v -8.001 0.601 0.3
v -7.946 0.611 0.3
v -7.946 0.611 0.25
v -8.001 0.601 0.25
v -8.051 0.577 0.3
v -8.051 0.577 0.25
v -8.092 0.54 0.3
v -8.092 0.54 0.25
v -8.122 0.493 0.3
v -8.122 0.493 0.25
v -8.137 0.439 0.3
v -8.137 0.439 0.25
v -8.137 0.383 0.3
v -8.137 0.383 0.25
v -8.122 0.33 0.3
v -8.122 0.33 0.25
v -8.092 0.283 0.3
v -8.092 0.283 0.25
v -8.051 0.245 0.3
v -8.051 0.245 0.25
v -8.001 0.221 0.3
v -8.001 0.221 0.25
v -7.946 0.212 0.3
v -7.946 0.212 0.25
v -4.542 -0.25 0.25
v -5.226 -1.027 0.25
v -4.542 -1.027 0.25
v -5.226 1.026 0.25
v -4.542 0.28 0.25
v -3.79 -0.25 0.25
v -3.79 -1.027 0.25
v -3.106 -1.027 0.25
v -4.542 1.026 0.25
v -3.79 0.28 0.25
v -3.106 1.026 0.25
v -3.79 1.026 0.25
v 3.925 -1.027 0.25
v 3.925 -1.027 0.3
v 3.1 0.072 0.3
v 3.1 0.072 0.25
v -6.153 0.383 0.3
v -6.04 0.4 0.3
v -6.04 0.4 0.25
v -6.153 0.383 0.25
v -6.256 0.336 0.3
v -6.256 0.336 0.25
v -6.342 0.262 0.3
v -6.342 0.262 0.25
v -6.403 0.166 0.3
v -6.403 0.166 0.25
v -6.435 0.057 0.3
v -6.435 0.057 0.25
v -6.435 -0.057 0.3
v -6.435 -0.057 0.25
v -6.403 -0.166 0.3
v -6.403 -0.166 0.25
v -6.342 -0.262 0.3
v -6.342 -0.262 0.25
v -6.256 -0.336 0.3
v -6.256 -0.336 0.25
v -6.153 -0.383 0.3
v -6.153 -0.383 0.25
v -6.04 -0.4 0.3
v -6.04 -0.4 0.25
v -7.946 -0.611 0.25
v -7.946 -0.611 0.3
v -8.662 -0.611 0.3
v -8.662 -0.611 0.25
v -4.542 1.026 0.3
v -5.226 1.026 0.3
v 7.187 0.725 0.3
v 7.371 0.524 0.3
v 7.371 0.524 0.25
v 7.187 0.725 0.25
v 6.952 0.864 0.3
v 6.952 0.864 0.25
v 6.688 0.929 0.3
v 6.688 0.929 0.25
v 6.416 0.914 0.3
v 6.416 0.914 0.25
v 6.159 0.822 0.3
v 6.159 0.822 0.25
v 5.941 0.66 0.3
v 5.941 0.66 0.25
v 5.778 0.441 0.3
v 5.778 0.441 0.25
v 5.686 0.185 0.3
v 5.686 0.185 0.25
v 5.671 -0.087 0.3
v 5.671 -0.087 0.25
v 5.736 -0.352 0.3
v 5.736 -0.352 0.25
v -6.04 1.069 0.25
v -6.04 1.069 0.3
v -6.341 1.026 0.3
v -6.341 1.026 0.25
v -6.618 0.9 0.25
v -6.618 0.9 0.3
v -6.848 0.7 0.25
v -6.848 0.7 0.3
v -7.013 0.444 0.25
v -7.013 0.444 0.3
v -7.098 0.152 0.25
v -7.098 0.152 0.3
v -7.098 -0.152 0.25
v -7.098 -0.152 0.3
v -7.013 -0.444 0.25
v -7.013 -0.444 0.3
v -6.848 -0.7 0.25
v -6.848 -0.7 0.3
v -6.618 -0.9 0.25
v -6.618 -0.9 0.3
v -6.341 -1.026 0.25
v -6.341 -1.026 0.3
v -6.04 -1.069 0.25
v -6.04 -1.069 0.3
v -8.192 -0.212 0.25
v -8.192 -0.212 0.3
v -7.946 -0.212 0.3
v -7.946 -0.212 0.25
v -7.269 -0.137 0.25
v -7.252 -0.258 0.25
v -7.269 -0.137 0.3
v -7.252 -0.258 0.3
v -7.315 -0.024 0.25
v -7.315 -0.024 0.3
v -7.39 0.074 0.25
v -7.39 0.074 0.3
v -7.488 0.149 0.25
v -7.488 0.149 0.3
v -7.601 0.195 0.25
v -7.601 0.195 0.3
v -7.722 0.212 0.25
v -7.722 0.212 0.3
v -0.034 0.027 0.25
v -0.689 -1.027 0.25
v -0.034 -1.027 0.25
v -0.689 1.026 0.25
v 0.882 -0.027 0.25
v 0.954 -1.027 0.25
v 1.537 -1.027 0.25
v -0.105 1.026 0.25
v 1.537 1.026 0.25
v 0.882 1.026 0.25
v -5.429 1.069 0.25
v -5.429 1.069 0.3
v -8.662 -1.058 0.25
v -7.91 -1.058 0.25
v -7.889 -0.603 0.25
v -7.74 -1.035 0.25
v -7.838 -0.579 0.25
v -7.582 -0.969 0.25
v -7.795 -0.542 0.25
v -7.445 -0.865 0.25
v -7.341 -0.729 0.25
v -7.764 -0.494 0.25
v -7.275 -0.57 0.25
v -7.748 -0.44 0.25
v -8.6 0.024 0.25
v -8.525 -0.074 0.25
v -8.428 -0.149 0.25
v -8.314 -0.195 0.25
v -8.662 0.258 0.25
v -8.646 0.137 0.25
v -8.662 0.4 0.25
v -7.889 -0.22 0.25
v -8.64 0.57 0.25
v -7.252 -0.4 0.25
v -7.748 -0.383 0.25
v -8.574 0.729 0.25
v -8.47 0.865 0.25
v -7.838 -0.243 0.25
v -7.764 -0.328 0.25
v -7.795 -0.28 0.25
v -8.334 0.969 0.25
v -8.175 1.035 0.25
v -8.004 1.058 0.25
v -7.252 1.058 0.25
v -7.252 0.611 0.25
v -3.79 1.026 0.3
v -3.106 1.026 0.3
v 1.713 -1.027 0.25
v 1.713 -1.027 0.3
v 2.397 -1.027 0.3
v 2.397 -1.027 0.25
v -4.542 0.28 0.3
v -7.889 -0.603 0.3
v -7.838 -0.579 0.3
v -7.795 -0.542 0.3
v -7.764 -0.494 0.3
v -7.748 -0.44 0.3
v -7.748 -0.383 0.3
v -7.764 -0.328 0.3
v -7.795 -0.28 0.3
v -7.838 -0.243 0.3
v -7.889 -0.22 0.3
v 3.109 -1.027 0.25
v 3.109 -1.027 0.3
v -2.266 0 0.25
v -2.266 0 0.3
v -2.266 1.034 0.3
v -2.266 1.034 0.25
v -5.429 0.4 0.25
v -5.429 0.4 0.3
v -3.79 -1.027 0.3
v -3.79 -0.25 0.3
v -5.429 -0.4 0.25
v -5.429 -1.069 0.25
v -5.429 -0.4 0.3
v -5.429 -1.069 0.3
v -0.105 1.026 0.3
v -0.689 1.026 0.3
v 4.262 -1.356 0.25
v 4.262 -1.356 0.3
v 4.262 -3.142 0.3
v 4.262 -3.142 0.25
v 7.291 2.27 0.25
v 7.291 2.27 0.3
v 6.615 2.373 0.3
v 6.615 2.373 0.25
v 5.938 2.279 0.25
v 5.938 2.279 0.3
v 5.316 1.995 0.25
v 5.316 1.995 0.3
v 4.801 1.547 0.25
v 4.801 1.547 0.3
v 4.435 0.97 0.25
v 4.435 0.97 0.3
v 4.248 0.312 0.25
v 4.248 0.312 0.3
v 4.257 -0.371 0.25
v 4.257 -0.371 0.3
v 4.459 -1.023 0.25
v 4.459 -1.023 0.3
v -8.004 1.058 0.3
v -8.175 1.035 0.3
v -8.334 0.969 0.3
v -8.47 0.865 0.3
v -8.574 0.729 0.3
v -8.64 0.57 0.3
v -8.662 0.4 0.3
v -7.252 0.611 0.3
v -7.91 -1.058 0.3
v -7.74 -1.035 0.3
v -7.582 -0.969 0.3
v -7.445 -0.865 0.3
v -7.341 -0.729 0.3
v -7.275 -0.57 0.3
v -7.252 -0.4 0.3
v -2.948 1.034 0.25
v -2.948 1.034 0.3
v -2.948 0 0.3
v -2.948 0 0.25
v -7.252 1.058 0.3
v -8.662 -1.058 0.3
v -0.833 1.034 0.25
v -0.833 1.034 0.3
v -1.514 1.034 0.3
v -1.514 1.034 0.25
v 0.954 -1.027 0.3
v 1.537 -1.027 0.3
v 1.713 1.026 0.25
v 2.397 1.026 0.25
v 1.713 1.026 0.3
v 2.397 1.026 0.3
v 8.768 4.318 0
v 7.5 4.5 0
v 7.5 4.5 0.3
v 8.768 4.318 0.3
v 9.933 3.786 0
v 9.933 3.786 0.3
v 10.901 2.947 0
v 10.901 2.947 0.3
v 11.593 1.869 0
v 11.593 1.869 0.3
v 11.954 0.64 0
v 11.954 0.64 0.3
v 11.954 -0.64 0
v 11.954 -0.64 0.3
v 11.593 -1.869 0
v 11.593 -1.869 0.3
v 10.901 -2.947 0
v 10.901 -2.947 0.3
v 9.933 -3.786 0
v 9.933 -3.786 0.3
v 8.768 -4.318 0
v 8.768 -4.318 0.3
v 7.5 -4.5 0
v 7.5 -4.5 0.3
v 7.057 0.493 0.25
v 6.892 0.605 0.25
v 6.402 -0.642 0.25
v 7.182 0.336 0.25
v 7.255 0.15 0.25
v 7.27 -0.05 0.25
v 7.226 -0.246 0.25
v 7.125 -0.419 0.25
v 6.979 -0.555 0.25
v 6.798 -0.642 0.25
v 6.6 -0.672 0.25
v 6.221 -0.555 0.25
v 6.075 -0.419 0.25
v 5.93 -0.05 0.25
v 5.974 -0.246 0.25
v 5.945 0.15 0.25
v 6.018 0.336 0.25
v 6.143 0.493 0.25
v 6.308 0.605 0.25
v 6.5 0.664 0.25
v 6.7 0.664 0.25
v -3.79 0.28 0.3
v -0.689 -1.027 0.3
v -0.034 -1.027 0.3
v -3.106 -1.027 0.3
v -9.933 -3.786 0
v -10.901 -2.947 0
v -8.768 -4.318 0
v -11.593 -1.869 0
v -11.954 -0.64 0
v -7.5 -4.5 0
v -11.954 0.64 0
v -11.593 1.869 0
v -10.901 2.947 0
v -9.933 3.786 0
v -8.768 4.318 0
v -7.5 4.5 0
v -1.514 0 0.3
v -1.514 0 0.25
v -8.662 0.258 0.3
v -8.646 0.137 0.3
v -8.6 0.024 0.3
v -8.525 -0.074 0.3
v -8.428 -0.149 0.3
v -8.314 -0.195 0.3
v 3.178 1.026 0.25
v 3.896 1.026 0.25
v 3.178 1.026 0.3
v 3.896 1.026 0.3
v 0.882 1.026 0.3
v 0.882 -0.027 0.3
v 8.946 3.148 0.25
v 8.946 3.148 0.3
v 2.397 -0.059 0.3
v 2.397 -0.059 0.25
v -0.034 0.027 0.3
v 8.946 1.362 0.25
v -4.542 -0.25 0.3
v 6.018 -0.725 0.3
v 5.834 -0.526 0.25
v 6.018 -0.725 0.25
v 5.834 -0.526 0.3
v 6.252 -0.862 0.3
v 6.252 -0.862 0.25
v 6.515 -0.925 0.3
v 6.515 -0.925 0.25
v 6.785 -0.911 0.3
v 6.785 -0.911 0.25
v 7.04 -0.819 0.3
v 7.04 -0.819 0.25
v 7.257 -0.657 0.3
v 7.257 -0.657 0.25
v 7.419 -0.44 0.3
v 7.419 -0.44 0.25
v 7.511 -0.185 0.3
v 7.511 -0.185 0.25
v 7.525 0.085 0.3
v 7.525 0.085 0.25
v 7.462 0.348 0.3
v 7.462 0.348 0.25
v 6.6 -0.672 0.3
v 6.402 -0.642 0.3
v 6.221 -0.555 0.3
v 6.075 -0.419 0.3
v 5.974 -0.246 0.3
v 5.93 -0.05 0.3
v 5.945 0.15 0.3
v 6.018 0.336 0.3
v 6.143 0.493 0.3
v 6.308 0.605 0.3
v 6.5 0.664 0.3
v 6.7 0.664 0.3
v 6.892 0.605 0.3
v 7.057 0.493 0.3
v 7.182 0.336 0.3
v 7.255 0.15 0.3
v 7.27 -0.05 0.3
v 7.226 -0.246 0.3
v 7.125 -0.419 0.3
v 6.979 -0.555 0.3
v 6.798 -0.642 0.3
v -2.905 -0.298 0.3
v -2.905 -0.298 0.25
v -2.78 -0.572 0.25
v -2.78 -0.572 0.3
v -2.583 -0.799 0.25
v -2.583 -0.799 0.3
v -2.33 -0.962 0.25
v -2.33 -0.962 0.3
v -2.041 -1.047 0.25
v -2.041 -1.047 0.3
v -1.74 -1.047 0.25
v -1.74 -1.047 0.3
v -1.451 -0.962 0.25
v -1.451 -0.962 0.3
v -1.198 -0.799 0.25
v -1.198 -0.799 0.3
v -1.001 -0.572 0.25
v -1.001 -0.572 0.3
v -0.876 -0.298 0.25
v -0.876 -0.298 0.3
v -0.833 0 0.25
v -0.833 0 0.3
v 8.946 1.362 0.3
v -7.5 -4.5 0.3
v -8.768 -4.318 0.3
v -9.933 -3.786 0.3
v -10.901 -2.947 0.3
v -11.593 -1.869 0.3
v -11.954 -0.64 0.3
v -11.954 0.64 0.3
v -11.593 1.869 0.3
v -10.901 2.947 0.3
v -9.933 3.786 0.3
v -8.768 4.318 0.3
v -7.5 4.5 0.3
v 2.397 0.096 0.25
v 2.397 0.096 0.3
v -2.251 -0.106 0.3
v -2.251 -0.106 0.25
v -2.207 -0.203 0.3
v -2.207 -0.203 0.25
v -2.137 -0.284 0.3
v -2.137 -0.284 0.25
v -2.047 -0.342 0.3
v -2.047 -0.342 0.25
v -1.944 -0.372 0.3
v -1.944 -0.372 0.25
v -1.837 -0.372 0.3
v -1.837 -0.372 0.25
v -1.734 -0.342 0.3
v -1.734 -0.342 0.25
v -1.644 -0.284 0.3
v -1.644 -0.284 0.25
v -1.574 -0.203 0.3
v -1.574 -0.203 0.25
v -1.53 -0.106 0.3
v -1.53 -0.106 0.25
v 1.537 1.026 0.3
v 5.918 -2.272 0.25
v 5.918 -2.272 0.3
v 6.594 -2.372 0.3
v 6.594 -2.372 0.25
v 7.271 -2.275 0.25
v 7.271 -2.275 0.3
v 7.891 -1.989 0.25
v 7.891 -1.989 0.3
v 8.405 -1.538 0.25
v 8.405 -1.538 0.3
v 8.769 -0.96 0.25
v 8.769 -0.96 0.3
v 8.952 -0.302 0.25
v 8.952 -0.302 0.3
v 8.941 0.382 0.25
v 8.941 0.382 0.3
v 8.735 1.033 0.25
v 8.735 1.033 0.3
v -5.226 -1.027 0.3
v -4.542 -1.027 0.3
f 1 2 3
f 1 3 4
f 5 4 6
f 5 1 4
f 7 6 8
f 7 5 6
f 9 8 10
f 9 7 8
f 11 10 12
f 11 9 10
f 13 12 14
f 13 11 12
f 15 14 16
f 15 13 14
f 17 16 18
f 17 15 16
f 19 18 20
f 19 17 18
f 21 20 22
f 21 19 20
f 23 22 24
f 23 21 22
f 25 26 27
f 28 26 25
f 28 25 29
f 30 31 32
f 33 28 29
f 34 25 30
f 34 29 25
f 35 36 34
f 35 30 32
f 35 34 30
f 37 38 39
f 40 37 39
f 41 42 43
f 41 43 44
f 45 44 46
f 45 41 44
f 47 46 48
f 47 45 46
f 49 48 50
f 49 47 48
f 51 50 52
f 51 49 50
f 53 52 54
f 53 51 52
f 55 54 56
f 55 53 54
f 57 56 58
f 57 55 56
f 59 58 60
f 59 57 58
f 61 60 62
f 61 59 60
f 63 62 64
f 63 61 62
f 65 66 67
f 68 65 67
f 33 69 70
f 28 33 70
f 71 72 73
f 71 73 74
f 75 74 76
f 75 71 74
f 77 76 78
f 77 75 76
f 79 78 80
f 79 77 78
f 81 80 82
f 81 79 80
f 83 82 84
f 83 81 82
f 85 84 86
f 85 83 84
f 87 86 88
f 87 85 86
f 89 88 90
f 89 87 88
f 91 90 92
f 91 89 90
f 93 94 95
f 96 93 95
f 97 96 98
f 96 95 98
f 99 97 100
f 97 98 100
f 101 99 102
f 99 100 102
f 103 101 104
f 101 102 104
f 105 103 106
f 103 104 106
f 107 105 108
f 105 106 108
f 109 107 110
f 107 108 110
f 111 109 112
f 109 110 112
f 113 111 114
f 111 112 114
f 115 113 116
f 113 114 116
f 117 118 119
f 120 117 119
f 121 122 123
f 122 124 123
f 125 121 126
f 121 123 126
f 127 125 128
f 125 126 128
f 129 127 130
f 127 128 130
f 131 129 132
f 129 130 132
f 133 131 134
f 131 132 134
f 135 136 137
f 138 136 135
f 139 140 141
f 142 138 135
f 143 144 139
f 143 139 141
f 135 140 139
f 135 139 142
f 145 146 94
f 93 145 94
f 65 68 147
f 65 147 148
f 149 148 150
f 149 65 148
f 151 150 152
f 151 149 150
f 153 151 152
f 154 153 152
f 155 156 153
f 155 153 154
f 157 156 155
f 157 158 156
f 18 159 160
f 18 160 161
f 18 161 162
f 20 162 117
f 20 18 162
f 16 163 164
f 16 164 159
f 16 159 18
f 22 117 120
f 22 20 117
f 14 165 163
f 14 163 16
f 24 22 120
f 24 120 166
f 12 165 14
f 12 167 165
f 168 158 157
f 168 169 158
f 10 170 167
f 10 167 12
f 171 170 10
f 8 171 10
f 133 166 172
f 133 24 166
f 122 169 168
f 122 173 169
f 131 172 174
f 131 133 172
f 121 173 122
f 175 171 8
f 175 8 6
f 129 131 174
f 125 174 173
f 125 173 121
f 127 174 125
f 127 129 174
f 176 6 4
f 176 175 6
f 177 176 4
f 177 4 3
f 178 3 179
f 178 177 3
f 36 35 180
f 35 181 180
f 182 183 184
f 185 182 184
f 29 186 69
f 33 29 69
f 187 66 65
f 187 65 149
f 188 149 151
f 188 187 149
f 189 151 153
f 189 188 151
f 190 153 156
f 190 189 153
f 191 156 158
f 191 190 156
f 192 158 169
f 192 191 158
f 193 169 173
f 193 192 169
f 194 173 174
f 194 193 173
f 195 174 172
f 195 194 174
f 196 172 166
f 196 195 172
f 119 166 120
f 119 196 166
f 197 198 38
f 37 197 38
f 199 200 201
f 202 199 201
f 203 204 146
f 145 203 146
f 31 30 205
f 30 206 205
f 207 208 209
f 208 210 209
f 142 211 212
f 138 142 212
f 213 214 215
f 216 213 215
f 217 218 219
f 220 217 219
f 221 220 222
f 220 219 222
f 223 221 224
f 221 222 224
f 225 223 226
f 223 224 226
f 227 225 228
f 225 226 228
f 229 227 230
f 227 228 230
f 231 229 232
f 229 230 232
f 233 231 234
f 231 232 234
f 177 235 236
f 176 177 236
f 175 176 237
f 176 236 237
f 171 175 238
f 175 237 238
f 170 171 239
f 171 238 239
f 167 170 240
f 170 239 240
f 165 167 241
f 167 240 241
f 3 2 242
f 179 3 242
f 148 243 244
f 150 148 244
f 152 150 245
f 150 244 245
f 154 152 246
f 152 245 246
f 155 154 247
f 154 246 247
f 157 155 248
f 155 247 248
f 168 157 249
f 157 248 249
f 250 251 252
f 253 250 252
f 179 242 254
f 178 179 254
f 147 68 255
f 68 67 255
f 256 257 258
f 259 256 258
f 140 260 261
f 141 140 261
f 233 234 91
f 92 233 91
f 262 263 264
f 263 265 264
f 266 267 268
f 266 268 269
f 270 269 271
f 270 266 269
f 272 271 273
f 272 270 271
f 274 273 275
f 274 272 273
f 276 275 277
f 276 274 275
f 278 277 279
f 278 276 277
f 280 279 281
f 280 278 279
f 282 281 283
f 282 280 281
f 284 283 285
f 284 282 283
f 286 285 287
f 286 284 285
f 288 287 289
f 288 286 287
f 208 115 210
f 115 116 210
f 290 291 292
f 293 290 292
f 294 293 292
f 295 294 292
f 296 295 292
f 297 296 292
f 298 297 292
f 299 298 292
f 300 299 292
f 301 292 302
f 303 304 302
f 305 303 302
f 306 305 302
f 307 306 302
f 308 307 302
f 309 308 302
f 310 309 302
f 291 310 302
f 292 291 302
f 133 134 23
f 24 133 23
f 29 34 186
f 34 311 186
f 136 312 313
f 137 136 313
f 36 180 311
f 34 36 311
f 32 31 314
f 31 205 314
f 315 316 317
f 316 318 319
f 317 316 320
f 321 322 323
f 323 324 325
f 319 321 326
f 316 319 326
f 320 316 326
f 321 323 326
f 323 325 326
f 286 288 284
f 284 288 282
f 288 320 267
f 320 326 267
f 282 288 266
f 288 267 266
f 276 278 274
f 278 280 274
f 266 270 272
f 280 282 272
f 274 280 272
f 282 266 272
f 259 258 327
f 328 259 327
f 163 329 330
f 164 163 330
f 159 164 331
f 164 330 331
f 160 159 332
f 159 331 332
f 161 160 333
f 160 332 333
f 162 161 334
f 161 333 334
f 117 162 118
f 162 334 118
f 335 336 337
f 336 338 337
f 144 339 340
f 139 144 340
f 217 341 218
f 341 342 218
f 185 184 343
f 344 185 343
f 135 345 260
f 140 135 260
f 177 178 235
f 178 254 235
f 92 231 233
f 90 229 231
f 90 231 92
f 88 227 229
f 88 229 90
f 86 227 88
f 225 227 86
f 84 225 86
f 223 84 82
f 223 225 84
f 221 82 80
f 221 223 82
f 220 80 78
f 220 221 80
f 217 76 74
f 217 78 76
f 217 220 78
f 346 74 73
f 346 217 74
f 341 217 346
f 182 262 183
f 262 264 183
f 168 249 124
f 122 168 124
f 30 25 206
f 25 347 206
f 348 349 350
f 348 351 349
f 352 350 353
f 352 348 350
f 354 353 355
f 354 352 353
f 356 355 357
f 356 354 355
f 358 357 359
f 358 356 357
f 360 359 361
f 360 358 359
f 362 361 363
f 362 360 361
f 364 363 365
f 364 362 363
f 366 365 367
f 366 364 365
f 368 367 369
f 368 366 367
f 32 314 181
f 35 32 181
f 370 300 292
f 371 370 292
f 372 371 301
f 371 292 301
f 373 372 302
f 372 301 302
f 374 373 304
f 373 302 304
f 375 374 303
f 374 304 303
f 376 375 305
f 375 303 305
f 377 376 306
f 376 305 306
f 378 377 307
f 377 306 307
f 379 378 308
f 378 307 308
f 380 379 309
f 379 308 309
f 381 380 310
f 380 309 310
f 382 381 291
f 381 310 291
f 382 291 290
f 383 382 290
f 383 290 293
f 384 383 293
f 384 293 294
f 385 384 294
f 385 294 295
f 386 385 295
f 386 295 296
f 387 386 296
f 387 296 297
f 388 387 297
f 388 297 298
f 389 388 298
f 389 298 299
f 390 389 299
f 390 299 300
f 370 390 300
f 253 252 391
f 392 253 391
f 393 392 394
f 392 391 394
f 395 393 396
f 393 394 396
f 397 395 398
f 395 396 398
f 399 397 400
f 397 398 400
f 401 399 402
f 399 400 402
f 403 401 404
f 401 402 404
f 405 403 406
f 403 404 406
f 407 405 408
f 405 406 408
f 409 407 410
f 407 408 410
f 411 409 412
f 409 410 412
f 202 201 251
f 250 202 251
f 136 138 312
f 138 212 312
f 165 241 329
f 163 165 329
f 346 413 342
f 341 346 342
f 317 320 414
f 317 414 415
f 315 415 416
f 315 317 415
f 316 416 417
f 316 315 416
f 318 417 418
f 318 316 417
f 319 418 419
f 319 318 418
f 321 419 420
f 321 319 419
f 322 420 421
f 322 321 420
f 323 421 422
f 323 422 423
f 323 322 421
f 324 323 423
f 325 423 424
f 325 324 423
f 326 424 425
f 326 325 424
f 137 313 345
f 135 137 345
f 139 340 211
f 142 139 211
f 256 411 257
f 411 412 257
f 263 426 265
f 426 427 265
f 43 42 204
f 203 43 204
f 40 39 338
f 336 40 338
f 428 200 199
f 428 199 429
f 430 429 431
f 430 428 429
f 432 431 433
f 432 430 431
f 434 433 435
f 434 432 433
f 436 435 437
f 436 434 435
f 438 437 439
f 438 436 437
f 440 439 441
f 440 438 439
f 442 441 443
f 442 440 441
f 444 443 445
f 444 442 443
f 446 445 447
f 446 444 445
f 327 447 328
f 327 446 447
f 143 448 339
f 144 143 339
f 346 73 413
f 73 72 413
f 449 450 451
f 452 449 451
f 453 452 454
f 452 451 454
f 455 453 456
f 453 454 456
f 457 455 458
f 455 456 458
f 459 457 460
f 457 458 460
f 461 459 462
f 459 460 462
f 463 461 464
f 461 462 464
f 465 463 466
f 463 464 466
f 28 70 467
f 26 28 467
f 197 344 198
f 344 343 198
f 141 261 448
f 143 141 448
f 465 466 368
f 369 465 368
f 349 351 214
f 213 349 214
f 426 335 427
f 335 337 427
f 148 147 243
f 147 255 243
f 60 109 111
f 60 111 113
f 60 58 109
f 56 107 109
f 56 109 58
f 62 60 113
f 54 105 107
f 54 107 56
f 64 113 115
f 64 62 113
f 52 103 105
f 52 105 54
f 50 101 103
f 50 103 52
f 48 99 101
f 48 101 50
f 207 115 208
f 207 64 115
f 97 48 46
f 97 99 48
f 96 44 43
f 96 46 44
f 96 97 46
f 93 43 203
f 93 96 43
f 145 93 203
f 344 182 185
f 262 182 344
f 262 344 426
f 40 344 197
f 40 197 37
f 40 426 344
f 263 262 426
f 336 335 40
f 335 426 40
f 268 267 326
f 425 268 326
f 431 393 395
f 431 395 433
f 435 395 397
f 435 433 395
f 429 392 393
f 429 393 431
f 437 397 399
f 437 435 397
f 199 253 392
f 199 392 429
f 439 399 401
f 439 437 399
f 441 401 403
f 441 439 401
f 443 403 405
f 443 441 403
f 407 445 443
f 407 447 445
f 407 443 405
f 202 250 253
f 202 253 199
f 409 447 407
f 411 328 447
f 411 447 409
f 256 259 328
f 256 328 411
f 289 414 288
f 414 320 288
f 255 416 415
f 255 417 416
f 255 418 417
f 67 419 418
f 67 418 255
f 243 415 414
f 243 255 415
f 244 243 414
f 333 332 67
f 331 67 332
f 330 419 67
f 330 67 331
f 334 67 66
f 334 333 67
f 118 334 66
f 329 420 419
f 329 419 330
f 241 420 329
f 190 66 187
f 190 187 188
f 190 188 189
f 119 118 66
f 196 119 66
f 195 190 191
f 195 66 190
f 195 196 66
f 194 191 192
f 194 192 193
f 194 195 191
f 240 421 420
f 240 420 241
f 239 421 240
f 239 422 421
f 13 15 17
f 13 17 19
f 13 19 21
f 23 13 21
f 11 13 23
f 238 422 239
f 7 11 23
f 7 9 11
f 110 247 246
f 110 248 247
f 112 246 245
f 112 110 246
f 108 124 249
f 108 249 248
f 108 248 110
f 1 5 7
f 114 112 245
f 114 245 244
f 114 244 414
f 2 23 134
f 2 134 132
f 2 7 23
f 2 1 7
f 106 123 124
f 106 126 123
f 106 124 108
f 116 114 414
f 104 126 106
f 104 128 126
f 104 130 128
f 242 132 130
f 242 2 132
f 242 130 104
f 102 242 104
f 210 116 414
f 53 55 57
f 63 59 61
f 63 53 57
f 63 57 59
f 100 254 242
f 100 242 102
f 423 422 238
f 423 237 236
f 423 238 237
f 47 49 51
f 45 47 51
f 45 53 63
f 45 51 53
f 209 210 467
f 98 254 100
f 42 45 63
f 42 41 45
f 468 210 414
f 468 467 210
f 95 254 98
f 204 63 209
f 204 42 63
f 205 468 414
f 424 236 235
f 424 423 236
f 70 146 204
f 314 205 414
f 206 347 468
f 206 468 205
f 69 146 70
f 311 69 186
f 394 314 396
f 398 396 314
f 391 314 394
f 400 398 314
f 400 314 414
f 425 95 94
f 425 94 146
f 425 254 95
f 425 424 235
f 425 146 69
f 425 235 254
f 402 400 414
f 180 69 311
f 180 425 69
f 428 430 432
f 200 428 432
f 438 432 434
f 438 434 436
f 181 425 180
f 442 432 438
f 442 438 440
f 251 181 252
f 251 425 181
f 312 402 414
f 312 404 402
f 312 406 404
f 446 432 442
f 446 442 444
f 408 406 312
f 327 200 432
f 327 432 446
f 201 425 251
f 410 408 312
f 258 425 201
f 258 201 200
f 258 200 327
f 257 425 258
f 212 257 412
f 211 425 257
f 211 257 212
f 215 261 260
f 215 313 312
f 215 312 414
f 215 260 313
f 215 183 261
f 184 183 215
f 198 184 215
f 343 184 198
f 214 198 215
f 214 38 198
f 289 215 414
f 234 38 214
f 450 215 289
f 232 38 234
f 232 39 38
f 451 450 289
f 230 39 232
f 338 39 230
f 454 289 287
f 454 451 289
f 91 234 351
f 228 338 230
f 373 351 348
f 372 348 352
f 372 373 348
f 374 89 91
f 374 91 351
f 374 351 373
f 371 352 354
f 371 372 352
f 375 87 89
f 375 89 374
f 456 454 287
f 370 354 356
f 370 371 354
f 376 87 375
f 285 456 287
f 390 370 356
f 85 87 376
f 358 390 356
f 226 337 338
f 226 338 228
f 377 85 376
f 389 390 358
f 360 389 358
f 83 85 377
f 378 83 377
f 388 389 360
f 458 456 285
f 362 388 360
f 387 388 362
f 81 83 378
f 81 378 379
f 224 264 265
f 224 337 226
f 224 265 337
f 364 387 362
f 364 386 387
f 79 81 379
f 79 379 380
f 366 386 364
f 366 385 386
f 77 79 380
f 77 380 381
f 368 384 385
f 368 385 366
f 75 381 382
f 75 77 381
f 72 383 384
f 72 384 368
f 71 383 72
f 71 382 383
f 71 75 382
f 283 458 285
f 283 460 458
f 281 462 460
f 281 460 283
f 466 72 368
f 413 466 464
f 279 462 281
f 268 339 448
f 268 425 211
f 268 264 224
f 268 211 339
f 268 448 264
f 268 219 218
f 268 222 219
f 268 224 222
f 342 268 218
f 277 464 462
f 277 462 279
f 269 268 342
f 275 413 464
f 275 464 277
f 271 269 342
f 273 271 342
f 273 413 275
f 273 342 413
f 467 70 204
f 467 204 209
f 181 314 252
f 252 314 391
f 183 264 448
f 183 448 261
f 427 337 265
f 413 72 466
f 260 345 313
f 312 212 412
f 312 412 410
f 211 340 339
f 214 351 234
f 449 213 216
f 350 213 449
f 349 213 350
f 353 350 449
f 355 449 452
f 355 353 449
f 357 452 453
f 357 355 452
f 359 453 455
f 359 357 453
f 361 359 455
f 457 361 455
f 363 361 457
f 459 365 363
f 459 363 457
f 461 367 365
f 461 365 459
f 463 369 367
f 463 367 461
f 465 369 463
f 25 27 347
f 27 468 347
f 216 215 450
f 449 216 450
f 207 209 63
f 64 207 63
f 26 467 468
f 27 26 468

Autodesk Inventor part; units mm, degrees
sketch "Sketch_1" plane through (0, 0, 0) normal (0, 0, 1) x (1, 0, 0)
  arc A0 (-12, 0) -> (-7.5, -4.5) centre (-7.5, 0) ccw
  line L0 (-7.5, -4.5) -> (7.5, -4.5)
  arc A1 (7.5, -4.5) -> (12, 0) centre (7.5, 0) ccw
  arc A2 (12, 0) -> (7.5, 4.5) centre (7.5, 0) ccw
  line L1 (7.5, 4.5) -> (-7.5, 4.5)
  arc A3 (-7.5, 4.5) -> (-12, 0) centre (-7.5, 0) ccw
extrude "Extrusion1" add sketch "Sketch_1" along normal blind 0.3
sketch "Sketch_13" plane through (0, 0, 0.3) normal (0, 0, 1) x (1, 0, 0)
  line L0 (-5.2261, 1.0265) -> (-5.2261, -1.027)
  line L1 (-5.2261, -1.027) -> (-4.5423, -1.027)
  line L2 (-4.5423, -1.027) -> (-4.5423, -0.2502)
  line L3 (-4.5423, -0.2502) -> (-3.7899, -0.2502)
  line L4 (-3.7899, -0.2502) -> (-3.7899, -1.027)
  line L5 (-3.7899, -1.027) -> (-3.106, -1.027)
  line L6 (-3.106, -1.027) -> (-3.106, 1.0265)
  line L7 (-3.106, 1.0265) -> (-3.7899, 1.0265)
  line L8 (-3.7899, 1.0265) -> (-3.7899, 0.2798)
  line L9 (-3.7899, 0.2798) -> (-4.5423, 0.2798)
  line L10 (-4.5423, 0.2798) -> (-4.5423, 1.0265)
  line L11 (-4.5423, 1.0265) -> (-5.2261, 1.0265)
extrude "Extrusion2" cut sketch "Sketch_13" against normal blind 0.05
sketch "Sketch_15" plane through (0, 0, 0.3) normal (0, 0, 1) x (1, 0, 0)
  line L0 (-0.689, 1.0265) -> (-0.689, -1.027)
  line L1 (-0.689, -1.027) -> (-0.0337, -1.027)
  line L2 (-0.0337, -1.027) -> (-0.0337, 0.0269)
  line L3 (-0.0337, 0.0269) -> (0.9535, -1.027)
  line L4 (0.9535, -1.027) -> (1.537, -1.027)
  line L5 (1.537, -1.027) -> (1.537, 1.0265)
  line L6 (1.537, 1.0265) -> (0.8819, 1.0265)
  line L7 (0.8819, 1.0265) -> (0.8819, -0.0273)
  line L8 (0.8819, -0.0273) -> (-0.1051, 1.0265)
  line L9 (-0.1051, 1.0265) -> (-0.689, 1.0265)
extrude "Extrusion3" cut sketch "Sketch_15" against normal blind 0.05
sketch "Sketch_16" plane through (0, 0, 0.3) normal (0, 0, 1) x (1, 0, 0)
  line L0 (1.7129, 1.0265) -> (1.7129, -1.027)
  line L1 (1.7129, -1.027) -> (2.3967, -1.027)
  line L2 (2.3967, -1.027) -> (2.3967, -0.0588)
  line L3 (2.3967, -0.0588) -> (3.1093, -1.027)
  line L4 (3.1093, -1.027) -> (3.9246, -1.027)
  line L5 (3.9246, -1.027) -> (3.1004, 0.0719)
  line L6 (3.1004, 0.0719) -> (3.8959, 1.0265)
  line L7 (3.8959, 1.0265) -> (3.1777, 1.0265)
  line L8 (3.1777, 1.0265) -> (2.3967, 0.0961)
  line L9 (2.3967, 0.0961) -> (2.3967, 1.0265)
  line L10 (2.3967, 1.0265) -> (1.7129, 1.0265)
extrude "Extrusion4" cut sketch "Sketch_16" against normal blind 0.05
sketch "Sketch_5" plane through (0, 0, 0.3) normal (0, 0, 1) x (1, 0, 0)
  arc A0 (-8.6625, 0.2585) -> (-8.1925, -0.2115) centre (-8.1925, 0.2585) ccw
  line L0 (-8.1925, -0.2115) -> (-7.9457, -0.2115)
  arc A1 (-7.9457, -0.611) -> (-7.9457, -0.2115) centre (-7.9457, -0.4113) ccw
  line L1 (-7.9457, -0.611) -> (-8.6625, -0.611)
  line L2 (-8.6625, -0.611) -> (-8.6625, -1.0575)
  line L3 (-8.6625, -1.0575) -> (-7.9105, -1.0575)
  arc A2 (-7.9105, -1.0575) -> (-7.2525, -0.3995) centre (-7.9105, -0.3995) ccw
  line L4 (-7.2525, -0.3995) -> (-7.2525, -0.2585)
  arc A3 (-7.2525, -0.2585) -> (-7.7225, 0.2115) centre (-7.7225, -0.2585) ccw
  line L5 (-7.7225, 0.2115) -> (-7.9457, 0.2115)
  arc A4 (-7.9457, 0.611) -> (-7.9457, 0.2115) centre (-7.9395, 0.4113) ccw
  line L6 (-7.9457, 0.611) -> (-7.2525, 0.611)
  line L7 (-7.2525, 0.611) -> (-7.2525, 1.0575)
  line L8 (-7.2525, 1.0575) -> (-8.0045, 1.0575)
  arc A5 (-8.0045, 1.0575) -> (-8.6625, 0.3995) centre (-8.0045, 0.3995) ccw
  line L9 (-8.6625, 0.3995) -> (-8.6625, 0.2585)
extrude "Extrusion5" cut sketch "Sketch_5" against normal blind 0.05
sketch "Sketch_6" plane through (0, 0, 0.3) normal (0, 0, 1) x (1, 0, 0)
  arc A0 (-6.04, 1.0693) -> (-6.04, -1.0693) centre (-6.04, 0) ccw
  line L0 (-6.04, -1.0693) -> (-5.429, -1.0693)
  line L1 (-5.429, -1.0693) -> (-5.429, -0.3995)
  line L2 (-5.429, -0.3995) -> (-6.04, -0.3995)
  arc A1 (-6.04, 0.3995) -> (-6.04, -0.3995) centre (-6.04, 0) ccw
  line L3 (-6.04, 0.3995) -> (-5.429, 0.3995)
  line L4 (-5.429, 0.3995) -> (-5.429, 1.0693)
  line L5 (-5.429, 1.0693) -> (-6.04, 1.0693)
extrude "Extrusion6" cut sketch "Sketch_6" against normal blind 0.05
sketch "Sketch_7" plane through (0, 0, 0.3) normal (0, 0, 1) x (1, 0, 0)
  line L0 (-2.948, 1.034) -> (-2.948, 0)
  arc A0 (-2.948, 0) -> (-0.833, 0) centre (-1.8905, 0) ccw
  line L1 (-0.833, 0) -> (-0.833, 1.034)
  line L2 (-0.833, 1.034) -> (-1.5145, 1.034)
  line L3 (-1.5145, 1.034) -> (-1.5145, 0)
  arc A1 (-2.2665, 0) -> (-1.5145, 0) centre (-1.8905, 0) ccw
  line L4 (-2.2665, 0) -> (-2.2665, 1.034)
  line L5 (-2.2665, 1.034) -> (-2.948, 1.034)
extrude "Extrusion7" cut sketch "Sketch_7" against normal blind 0.05
sketch "Sketch8" plane through (0, 0, 0.3) normal (0, 0, 1) x (1, 0, 0)
  point P0 (6.6, 0)
hole "Hole1" at (6.6, 0, 0.3) direction (0, 0, -1) diameter 1.344 depth 0.05
sketch "Sketch_3" plane through (0, 0, 0.3) normal (0, 0, 1) x (1, 0, 0)
  arc A0 (7.2909, 2.2698) -> (4.4594, -1.0234) centre (6.6, 0) ccw
  line L0 (4.4594, -1.0234) -> (5.7362, -0.352)
  arc A1 (7.3714, 0.5243) -> (5.7362, -0.352) centre (6.6, 0) ccw
  line L1 (7.3714, 0.5243) -> (8.9464, 1.3615)
  line L2 (8.9464, 1.3615) -> (8.9464, 3.1479)
  line L3 (8.9464, 3.1479) -> (7.2909, 2.2698)
extrude "Extrusion8" cut sketch "Sketch_3" against normal blind 0.05
sketch "Sketch_4" plane through (0, 0, 0.3) normal (0, 0, 1) x (1, 0, 0)
  line L0 (4.262, -1.3559) -> (4.262, -3.1423)
  line L1 (4.262, -3.1423) -> (5.9182, -2.2715)
  arc A0 (5.9182, -2.2715) -> (8.7347, 1.0332) centre (6.6, 0) ccw
  line L2 (8.7347, 1.0332) -> (7.4617, 0.3479)
  arc A1 (5.8342, -0.5264) -> (7.4617, 0.3479) centre (6.6, 0) ccw
  line L3 (5.8342, -0.5264) -> (4.262, -1.3559)
extrude "Extrusion9" cut sketch "Sketch_4" against normal blind 0.05
ref_plane "aluschild_XY" through (0, 0, 0) normal (0, 0, 1) x (1, 0, 0)
ref_plane "aluschild_YZ" through (0, 0, 0) normal (1, 0, 0) x (0, 1, 0)
ref_plane "aluschild_ZX" through (0, 0, 0) normal (0, 1, 0) x (0, 0, 1)
properties part number "SCHUNK-9905502 Typenschild 9x24x0.3"
